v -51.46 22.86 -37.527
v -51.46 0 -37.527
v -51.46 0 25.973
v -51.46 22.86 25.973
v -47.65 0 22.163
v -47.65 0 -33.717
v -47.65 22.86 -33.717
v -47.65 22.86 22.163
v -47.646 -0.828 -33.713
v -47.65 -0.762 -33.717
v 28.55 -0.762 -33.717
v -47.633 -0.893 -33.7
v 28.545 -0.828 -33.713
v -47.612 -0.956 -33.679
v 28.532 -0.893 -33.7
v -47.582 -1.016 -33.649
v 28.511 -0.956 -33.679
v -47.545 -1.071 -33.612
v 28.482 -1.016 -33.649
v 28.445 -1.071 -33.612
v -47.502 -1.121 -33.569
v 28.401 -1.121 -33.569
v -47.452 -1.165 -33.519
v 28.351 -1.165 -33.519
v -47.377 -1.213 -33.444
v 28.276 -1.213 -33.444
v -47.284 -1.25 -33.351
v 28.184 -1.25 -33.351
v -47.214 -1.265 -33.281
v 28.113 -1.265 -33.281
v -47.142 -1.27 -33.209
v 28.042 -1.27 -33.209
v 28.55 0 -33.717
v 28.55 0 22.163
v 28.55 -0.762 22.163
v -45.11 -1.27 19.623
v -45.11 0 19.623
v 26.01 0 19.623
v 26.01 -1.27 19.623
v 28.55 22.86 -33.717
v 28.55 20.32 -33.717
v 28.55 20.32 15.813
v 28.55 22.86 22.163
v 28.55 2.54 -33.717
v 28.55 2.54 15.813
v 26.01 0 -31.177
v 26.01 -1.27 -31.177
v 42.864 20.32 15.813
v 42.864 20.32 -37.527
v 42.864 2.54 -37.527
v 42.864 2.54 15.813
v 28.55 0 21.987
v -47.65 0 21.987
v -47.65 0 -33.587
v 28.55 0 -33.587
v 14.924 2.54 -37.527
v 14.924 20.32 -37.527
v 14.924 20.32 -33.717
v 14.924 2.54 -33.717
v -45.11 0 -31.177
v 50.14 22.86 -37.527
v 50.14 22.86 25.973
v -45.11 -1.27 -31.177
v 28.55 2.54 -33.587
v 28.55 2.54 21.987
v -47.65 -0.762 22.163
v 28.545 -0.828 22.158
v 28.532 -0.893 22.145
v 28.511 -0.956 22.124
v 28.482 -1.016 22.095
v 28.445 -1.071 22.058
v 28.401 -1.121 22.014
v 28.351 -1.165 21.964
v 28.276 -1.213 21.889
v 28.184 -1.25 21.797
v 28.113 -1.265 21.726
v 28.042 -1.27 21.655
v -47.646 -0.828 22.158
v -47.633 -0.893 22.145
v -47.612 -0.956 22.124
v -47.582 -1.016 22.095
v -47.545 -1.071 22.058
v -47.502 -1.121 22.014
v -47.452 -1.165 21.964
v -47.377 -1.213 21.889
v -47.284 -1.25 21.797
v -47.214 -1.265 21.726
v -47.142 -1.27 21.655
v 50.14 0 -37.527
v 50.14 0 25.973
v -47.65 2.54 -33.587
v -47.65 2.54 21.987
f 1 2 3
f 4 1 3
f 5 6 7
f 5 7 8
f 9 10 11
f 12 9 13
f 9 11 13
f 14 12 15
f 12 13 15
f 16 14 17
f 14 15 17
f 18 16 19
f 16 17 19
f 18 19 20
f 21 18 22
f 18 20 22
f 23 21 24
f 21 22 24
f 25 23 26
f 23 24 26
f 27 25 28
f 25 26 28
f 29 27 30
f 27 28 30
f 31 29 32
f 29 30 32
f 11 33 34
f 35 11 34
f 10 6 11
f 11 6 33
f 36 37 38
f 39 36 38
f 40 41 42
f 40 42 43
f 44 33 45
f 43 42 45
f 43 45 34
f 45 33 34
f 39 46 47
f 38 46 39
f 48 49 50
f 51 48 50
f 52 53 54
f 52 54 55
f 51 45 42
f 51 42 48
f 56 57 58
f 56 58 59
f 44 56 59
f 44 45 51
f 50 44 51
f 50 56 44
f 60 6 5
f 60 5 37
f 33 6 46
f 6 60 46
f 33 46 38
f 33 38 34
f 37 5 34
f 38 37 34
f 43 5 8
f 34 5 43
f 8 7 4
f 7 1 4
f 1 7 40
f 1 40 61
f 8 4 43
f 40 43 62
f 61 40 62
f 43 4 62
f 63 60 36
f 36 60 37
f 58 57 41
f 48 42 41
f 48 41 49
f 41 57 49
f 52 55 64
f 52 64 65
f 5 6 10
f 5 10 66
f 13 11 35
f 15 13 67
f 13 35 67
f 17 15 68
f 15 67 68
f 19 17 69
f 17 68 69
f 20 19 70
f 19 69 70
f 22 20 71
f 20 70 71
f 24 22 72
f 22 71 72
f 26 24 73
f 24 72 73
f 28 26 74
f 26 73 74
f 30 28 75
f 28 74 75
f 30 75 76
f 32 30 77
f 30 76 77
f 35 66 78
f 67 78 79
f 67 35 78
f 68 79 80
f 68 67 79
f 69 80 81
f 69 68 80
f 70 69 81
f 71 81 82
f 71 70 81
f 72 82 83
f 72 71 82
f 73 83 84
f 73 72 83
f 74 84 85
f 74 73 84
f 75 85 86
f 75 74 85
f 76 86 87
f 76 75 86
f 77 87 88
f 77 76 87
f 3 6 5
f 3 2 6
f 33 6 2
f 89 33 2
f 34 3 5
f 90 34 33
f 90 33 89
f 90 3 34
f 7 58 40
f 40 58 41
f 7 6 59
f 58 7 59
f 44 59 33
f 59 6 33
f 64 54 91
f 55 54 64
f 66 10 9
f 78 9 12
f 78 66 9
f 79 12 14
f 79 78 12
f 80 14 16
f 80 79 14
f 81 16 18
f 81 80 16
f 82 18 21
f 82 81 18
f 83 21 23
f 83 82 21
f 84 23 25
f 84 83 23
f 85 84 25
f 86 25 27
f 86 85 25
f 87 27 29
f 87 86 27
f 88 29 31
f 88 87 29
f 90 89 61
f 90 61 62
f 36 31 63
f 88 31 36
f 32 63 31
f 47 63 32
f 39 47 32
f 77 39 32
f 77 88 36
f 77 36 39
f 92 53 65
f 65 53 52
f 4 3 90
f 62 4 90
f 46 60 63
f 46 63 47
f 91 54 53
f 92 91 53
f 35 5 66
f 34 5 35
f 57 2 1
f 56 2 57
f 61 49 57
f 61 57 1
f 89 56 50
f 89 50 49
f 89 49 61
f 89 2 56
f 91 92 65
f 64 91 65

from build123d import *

# Parameters (mm, degrees)
F0_W     = 76.2
F0_H     = 55.88
F0_W_2   = 71.12
F0_H_2   = 50.8
F1_DEPTH = 1.27
F2_R     = 0.508
F0_W_3   = 101.6
F0_H_3   = 63.5
F3_DEPTH = 22.86
F4_W     = 76.2
F4_H     = 55.5743090808
F5_DEPTH = 2.54
F6_W     = 27.94
F6_H     = 17.78
F7_DEPTH = 53.34


with BuildPart() as f1:
    # F0 (on Front) → F1 (new body)
    with BuildSketch(Plane.XZ):
        with Locations((-9.550315156, -5.7773459782)):
            Rectangle(F0_W, F0_H)
        with Locations((-9.550315156, -5.7773459782)):
            Rectangle(F0_W_2, F0_H_2, mode=Mode.SUBTRACT)
    extrude(amount=F1_DEPTH)

    # F2
    f2_edges = [f1.edges().sort_by_distance(p)[0] for p in [
        (28.549685, -1.27, -5.777346),
        (-9.550315, -1.27, 22.162654),
        (-9.550315, -1.27, -33.717346),
        (-47.650315, -1.27, -5.777346),
    ]]
    fillet(f2_edges, radius=F2_R)


with BuildPart() as f3:
    # F0 (on Front) → F3 (new body)
    with BuildSketch(Plane.XZ):
        with Locations((-0.660315156, -5.7773459782)):
            Rectangle(F0_W_3, F0_H_3)
        with Locations((-9.550315156, -5.7773459782)):
            Rectangle(F0_W, F0_H, mode=Mode.SUBTRACT)
    extrude(amount=-F3_DEPTH)

    # F6 (on face) → F7 (cut)
    with BuildSketch(Plane(origin=(0, 0, -37.5273459782), x_dir=(1, 0, 0), z_dir=(0, 0, -1))):
        with Locations((28.8940501184, -11.43)):
            Rectangle(F6_W, F6_H)
    extrude(amount=-F7_DEPTH, mode=Mode.SUBTRACT)


with BuildPart() as f5:
    # F4 (on face) → F5 (new body)
    with BuildSketch(Plane.XZ):
        with Locations((-9.550315156, -5.8000367135)):
            Rectangle(F4_W, F4_H)
    extrude(amount=-F5_DEPTH)


solid = Compound([f1.part, f3.part, f5.part])
